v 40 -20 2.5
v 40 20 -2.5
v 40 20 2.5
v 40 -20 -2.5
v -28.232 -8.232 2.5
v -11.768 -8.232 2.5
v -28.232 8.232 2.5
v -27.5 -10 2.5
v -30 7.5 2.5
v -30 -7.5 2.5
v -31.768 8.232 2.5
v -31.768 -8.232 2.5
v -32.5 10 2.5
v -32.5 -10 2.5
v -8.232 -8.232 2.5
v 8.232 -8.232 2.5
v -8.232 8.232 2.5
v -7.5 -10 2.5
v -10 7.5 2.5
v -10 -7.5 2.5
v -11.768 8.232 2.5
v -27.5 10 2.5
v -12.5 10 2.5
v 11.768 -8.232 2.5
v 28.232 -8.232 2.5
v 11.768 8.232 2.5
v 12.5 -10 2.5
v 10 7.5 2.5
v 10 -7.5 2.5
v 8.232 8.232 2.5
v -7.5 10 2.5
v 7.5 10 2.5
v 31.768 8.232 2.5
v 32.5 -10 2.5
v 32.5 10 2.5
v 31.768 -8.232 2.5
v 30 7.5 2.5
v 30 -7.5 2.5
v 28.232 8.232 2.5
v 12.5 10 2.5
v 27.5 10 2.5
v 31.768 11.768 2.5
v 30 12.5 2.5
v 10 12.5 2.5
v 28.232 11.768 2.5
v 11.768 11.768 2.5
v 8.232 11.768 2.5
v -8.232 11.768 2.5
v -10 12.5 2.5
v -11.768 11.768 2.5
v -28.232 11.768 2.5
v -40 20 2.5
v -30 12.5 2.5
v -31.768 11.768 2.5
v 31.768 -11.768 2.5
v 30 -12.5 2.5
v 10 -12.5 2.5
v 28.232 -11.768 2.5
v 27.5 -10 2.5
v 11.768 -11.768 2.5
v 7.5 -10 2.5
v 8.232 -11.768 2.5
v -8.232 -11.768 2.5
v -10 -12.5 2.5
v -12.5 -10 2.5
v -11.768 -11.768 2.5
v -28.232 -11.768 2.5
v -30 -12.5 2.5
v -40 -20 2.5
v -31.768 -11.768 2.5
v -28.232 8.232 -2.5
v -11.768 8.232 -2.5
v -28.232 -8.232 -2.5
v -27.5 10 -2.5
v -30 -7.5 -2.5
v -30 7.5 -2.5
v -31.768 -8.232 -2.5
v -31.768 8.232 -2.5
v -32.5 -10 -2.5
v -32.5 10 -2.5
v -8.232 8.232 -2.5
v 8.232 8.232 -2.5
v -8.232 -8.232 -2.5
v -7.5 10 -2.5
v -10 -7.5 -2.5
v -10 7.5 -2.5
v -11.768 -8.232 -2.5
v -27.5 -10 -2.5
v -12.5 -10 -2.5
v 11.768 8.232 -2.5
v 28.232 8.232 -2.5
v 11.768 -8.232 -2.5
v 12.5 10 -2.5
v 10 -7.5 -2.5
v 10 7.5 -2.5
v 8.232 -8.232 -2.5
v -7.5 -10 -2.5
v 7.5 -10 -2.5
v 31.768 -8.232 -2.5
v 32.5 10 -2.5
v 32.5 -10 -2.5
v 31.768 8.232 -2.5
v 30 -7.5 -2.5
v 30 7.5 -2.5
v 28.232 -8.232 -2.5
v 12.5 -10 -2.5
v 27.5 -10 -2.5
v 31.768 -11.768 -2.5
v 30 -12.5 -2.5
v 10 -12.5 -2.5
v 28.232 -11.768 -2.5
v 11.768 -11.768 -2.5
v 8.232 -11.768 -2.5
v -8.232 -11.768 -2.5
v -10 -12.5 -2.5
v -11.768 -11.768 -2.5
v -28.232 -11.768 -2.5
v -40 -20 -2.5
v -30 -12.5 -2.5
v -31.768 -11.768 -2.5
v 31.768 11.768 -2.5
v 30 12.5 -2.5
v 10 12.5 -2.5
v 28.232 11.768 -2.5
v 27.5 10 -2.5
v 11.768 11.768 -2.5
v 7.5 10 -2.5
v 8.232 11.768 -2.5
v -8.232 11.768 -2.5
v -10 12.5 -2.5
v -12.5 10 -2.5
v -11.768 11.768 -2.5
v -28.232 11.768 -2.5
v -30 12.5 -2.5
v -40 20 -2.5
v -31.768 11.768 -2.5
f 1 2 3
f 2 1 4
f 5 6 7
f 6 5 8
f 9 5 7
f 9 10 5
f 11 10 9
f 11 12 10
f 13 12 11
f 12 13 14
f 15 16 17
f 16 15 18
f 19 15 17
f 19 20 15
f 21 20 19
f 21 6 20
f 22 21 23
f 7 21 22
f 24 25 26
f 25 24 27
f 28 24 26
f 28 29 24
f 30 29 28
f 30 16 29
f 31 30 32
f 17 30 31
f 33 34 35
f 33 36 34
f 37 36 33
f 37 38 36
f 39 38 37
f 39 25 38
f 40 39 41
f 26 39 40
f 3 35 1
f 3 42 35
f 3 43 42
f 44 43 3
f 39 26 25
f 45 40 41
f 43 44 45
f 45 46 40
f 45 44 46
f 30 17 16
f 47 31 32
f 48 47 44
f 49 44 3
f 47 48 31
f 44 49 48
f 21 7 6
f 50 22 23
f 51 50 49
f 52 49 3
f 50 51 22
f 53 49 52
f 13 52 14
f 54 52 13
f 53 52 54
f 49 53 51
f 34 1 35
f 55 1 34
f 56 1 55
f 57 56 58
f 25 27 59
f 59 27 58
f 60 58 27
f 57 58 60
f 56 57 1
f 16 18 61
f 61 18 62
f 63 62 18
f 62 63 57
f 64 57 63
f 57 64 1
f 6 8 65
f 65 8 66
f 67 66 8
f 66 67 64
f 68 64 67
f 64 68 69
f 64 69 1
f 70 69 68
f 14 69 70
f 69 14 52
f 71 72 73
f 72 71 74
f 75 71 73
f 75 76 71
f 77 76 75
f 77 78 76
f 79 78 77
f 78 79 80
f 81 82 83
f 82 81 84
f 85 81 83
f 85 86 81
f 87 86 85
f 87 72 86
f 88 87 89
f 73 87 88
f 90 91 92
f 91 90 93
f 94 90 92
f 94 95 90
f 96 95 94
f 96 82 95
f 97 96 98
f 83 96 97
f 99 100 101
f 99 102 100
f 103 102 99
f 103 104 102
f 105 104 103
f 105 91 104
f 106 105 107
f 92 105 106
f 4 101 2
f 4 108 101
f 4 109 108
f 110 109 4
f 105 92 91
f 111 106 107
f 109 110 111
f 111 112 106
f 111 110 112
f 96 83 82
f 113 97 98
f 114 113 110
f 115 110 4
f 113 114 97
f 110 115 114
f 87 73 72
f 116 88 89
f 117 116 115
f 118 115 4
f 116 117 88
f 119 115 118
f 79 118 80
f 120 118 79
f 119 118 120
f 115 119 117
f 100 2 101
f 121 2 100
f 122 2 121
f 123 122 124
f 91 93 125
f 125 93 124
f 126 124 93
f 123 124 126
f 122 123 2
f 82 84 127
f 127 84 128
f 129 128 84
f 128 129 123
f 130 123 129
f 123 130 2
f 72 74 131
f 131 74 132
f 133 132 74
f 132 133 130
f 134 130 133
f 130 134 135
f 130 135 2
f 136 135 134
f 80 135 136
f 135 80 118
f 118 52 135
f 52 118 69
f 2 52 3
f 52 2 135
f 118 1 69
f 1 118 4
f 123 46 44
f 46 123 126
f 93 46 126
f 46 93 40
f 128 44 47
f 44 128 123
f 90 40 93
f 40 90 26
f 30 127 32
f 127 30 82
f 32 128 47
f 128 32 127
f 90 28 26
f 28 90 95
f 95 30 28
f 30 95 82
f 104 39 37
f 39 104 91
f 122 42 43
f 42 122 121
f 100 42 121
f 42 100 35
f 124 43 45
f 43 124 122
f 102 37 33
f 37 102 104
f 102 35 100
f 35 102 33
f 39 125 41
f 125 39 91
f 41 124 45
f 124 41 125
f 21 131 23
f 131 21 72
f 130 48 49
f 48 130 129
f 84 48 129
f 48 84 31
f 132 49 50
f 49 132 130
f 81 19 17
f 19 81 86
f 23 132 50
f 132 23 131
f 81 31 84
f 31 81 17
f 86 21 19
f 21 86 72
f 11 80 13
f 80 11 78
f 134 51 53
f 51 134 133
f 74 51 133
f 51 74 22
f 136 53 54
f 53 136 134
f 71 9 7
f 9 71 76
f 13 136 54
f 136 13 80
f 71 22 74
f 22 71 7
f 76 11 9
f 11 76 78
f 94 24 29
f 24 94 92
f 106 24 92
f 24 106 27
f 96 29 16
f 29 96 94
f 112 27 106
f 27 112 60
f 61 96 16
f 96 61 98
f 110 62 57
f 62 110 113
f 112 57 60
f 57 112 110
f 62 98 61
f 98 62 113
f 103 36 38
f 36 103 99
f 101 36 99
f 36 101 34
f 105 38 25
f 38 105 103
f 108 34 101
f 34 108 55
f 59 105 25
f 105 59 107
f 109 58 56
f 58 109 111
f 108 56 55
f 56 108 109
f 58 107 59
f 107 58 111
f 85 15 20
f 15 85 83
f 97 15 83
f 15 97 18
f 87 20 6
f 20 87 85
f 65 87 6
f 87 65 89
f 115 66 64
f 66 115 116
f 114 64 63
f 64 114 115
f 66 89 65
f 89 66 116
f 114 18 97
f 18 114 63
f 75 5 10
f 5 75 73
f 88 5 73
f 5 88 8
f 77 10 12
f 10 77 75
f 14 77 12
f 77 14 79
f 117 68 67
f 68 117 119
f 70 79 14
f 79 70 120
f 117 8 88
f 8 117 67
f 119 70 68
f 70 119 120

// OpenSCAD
// file: vars.scad
/* Makefile needs */
PART = "none";
IMAGE = "none";

/* frame */
height = 690;
width = 500;
depth = 500;

frame_size = 20;
frame_half = frame_size / 2;

glass_height = 3;
glass_width = 400;
glass_depth = 400;

rail_diam = 10;
z_rail_width = 60;
z_carriage_width = z_rail_width + frame_size;

// Sources for Metric fastener dimensions
// http://www.carbidedepot.com/formulas-tap-metric.htm
// http://www.roymech.co.uk/Useful_Tables/Screws/cap_screws.htm
// https://www.fairburyfastener.com/xdims_metric_nuts.htm

// M5
M5_bolt_diam = 5;
M5_bolt_hole = 5.5;
M5_nut_height = 4;
M5_nut_width = 7.9;
M5_nut_diam = 9;

// M4
M4_bolt_diam = 4;
M4_bolt_hole = 4.5;
M4_nut_height = 3.5;
M4_nut_width = 6.9;
M4_nut_diam = 8;


//608zz
608zz_height=7;
608zz_od=22;
608zz_id=8;
608zz_race=11;



// Height adjustment
pivot_diam=12;
height_bolt_diam=M4_bolt_diam;
// main file
/*
 *
 * Copyright 2019 Tim Schaller
 * All rights reserved
 * Released under the GPL3
 * No claims are made as to the fitness and/or corectness of
 * this work. Use at your own risk. If you create useless things,
 * or if the parts fail it is on you NOT ME. As far as I know
 * this might make your printer burst into flames or print
 * little pink bunnies. You call. };->
 *
 */

include <vars.scad>;

PART = "2020_dual_connector";

if (PART == "2020_dual_connector") {
    2020_dual_connector();
}
module 2020_dual_connector() {
  difference() {
    cube([80,40,5], center=true);
    translate([ 10, 10,0]) cylinder(h=6, d=5, center=true);
    translate([ 30, 10,0]) cylinder(h=6, d=5, center=true);
    translate([-10, 10,0]) cylinder(h=6, d=5, center=true);
    translate([-30, 10,0]) cylinder(h=6, d=5, center=true);
    translate([ 10,-10,0]) cylinder(h=6, d=5, center=true);
    translate([ 30,-10,0]) cylinder(h=6, d=5, center=true);
    translate([-10,-10,0]) cylinder(h=6, d=5, center=true);
    translate([-30,-10,0]) cylinder(h=6, d=5, center=true);
  }
}
